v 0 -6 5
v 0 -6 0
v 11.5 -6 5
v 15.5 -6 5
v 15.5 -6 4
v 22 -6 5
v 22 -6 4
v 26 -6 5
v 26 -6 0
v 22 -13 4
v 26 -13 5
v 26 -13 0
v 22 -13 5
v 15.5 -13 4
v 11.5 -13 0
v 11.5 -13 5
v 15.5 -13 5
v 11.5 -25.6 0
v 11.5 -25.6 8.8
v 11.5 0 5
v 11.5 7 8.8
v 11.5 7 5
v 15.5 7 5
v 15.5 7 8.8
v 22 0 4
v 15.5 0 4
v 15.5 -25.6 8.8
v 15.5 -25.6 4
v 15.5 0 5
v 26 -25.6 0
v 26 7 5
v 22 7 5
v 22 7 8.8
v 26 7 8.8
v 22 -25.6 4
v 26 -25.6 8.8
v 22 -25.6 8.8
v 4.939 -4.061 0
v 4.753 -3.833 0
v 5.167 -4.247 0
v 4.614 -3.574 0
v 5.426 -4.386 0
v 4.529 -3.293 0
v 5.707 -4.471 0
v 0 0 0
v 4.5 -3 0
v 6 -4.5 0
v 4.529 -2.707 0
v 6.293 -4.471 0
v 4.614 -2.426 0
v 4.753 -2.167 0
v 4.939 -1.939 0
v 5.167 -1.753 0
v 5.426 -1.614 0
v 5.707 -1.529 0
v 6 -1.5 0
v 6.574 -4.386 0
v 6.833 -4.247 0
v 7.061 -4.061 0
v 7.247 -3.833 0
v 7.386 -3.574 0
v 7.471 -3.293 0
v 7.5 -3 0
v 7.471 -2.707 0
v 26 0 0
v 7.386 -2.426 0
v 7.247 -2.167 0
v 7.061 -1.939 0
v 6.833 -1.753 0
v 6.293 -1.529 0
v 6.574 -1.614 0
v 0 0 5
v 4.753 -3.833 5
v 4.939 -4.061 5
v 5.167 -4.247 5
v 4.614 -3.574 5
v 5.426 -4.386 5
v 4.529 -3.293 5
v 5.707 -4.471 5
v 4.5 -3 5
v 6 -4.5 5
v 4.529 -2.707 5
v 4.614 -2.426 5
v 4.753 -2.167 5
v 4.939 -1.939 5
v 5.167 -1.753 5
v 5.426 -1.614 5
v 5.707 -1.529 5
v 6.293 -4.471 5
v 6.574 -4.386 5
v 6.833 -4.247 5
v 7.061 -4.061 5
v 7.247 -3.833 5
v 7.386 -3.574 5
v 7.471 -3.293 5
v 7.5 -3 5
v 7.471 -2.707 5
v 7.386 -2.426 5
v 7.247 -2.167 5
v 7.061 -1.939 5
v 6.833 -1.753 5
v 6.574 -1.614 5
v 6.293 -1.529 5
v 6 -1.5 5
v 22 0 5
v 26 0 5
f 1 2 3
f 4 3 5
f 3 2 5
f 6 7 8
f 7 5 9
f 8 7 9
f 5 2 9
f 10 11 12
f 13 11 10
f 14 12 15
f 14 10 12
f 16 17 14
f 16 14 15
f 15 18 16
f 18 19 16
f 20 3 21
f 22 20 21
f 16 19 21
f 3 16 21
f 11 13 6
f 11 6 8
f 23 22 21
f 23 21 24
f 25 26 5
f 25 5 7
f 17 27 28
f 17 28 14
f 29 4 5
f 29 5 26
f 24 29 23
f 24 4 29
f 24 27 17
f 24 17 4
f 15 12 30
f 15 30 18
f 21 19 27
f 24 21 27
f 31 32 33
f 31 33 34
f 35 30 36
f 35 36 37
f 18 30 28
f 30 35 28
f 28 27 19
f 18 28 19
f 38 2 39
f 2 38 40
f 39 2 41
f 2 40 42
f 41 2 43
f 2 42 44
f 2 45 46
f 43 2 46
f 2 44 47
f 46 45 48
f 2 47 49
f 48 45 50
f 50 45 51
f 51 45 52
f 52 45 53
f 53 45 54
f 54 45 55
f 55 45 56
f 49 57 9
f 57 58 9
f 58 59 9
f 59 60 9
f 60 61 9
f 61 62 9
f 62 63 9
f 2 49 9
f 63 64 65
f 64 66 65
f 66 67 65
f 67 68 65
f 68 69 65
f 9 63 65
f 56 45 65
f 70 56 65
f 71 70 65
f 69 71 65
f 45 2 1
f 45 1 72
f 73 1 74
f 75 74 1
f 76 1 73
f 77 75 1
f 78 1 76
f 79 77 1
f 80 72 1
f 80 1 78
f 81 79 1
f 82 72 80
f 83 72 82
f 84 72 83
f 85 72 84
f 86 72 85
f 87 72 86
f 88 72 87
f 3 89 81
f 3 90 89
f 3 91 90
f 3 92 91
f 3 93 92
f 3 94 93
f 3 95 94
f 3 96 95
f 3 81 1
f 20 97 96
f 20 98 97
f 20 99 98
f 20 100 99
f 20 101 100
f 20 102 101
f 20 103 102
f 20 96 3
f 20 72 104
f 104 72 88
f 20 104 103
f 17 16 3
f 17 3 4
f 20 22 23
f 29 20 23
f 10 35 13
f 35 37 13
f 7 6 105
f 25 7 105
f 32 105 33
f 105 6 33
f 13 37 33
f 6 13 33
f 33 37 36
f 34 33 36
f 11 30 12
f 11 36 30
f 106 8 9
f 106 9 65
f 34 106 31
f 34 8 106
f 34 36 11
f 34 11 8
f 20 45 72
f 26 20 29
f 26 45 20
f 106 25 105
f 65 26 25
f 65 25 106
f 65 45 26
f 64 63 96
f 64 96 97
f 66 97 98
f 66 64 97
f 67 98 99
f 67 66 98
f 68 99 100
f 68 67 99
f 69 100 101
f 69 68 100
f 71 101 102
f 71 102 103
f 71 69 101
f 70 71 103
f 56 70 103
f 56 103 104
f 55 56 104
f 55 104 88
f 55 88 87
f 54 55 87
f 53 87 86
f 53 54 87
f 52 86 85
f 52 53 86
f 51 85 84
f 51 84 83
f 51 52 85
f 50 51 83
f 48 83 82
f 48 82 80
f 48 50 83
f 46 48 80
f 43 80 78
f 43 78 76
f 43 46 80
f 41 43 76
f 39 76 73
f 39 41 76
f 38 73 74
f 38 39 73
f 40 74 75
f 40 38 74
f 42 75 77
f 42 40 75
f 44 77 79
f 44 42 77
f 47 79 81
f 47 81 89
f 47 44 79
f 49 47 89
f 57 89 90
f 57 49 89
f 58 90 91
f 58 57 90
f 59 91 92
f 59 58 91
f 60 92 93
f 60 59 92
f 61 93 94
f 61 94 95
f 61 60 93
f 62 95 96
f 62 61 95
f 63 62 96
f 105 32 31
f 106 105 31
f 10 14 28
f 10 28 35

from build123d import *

# Parameters (mm, degrees)
SKETCH_1_W          = 26
SKETCH_1_H          = 6
SKETCH_1_R          = 1.5
EXTRUDE_1_DEPTH     = 5
SKETCH_2_W          = 4
SKETCH_2_H          = 32.6
EXTRUDE_2_DEPTH     = 3.8
SKETCH_3_W          = 6.5
SKETCH_3_H          = 6.5
CUT_EXTRUDE_1_DEPTH = 1
SKETCH_4_W          = 14.5
SKETCH_4_H          = 12.6
EXTRUDE_3_DEPTH     = 5
SKETCH_5_W          = 6.5
SKETCH_5_H          = 12.6
CUT_EXTRUDE_2_DEPTH = 1


with BuildPart() as part:
    # 草图1 → 凸台-拉伸1 (new body)
    with BuildSketch(Plane.XY):
        with Locations((13, -3)):
            Rectangle(SKETCH_1_W, SKETCH_1_H)
        with Locations((6, -3)):
            Circle(SKETCH_1_R, mode=Mode.SUBTRACT)
    extrude(amount=EXTRUDE_1_DEPTH)

    # 草图2 → 凸台-拉伸2 (add)
    with BuildSketch(Plane.XY.offset(5)):
        with Locations((24, -9.3)):
            Rectangle(SKETCH_2_W, SKETCH_2_H)
        with Locations((13.5, -9.3)):
            Rectangle(SKETCH_2_W, SKETCH_2_H)
    extrude(amount=EXTRUDE_2_DEPTH)

    # 草图3 → 切除-拉伸1 (cut)
    with BuildSketch(Plane.XY.offset(5)):
        with Locations((18.75, -2.75)):
            Rectangle(SKETCH_3_W, SKETCH_3_H)
    extrude(amount=-CUT_EXTRUDE_1_DEPTH, mode=Mode.SUBTRACT)

    # 草图4 → 凸台-拉伸3 (add)
    with BuildSketch(Plane(origin=(0, 0, 5), x_dir=(-1, 0, 0), z_dir=(0, 0, -1))):
        with Locations((-18.75, -19.3)):
            Rectangle(SKETCH_4_W, SKETCH_4_H)
    extrude(amount=EXTRUDE_3_DEPTH)

    # 草图5 → 切除-拉伸2 (cut)
    with BuildSketch(Plane.XY.offset(5)):
        with Locations((18.75, -19.3)):
            Rectangle(SKETCH_5_W, SKETCH_5_H)
    extrude(amount=-CUT_EXTRUDE_2_DEPTH, mode=Mode.SUBTRACT)


solid = part.part
